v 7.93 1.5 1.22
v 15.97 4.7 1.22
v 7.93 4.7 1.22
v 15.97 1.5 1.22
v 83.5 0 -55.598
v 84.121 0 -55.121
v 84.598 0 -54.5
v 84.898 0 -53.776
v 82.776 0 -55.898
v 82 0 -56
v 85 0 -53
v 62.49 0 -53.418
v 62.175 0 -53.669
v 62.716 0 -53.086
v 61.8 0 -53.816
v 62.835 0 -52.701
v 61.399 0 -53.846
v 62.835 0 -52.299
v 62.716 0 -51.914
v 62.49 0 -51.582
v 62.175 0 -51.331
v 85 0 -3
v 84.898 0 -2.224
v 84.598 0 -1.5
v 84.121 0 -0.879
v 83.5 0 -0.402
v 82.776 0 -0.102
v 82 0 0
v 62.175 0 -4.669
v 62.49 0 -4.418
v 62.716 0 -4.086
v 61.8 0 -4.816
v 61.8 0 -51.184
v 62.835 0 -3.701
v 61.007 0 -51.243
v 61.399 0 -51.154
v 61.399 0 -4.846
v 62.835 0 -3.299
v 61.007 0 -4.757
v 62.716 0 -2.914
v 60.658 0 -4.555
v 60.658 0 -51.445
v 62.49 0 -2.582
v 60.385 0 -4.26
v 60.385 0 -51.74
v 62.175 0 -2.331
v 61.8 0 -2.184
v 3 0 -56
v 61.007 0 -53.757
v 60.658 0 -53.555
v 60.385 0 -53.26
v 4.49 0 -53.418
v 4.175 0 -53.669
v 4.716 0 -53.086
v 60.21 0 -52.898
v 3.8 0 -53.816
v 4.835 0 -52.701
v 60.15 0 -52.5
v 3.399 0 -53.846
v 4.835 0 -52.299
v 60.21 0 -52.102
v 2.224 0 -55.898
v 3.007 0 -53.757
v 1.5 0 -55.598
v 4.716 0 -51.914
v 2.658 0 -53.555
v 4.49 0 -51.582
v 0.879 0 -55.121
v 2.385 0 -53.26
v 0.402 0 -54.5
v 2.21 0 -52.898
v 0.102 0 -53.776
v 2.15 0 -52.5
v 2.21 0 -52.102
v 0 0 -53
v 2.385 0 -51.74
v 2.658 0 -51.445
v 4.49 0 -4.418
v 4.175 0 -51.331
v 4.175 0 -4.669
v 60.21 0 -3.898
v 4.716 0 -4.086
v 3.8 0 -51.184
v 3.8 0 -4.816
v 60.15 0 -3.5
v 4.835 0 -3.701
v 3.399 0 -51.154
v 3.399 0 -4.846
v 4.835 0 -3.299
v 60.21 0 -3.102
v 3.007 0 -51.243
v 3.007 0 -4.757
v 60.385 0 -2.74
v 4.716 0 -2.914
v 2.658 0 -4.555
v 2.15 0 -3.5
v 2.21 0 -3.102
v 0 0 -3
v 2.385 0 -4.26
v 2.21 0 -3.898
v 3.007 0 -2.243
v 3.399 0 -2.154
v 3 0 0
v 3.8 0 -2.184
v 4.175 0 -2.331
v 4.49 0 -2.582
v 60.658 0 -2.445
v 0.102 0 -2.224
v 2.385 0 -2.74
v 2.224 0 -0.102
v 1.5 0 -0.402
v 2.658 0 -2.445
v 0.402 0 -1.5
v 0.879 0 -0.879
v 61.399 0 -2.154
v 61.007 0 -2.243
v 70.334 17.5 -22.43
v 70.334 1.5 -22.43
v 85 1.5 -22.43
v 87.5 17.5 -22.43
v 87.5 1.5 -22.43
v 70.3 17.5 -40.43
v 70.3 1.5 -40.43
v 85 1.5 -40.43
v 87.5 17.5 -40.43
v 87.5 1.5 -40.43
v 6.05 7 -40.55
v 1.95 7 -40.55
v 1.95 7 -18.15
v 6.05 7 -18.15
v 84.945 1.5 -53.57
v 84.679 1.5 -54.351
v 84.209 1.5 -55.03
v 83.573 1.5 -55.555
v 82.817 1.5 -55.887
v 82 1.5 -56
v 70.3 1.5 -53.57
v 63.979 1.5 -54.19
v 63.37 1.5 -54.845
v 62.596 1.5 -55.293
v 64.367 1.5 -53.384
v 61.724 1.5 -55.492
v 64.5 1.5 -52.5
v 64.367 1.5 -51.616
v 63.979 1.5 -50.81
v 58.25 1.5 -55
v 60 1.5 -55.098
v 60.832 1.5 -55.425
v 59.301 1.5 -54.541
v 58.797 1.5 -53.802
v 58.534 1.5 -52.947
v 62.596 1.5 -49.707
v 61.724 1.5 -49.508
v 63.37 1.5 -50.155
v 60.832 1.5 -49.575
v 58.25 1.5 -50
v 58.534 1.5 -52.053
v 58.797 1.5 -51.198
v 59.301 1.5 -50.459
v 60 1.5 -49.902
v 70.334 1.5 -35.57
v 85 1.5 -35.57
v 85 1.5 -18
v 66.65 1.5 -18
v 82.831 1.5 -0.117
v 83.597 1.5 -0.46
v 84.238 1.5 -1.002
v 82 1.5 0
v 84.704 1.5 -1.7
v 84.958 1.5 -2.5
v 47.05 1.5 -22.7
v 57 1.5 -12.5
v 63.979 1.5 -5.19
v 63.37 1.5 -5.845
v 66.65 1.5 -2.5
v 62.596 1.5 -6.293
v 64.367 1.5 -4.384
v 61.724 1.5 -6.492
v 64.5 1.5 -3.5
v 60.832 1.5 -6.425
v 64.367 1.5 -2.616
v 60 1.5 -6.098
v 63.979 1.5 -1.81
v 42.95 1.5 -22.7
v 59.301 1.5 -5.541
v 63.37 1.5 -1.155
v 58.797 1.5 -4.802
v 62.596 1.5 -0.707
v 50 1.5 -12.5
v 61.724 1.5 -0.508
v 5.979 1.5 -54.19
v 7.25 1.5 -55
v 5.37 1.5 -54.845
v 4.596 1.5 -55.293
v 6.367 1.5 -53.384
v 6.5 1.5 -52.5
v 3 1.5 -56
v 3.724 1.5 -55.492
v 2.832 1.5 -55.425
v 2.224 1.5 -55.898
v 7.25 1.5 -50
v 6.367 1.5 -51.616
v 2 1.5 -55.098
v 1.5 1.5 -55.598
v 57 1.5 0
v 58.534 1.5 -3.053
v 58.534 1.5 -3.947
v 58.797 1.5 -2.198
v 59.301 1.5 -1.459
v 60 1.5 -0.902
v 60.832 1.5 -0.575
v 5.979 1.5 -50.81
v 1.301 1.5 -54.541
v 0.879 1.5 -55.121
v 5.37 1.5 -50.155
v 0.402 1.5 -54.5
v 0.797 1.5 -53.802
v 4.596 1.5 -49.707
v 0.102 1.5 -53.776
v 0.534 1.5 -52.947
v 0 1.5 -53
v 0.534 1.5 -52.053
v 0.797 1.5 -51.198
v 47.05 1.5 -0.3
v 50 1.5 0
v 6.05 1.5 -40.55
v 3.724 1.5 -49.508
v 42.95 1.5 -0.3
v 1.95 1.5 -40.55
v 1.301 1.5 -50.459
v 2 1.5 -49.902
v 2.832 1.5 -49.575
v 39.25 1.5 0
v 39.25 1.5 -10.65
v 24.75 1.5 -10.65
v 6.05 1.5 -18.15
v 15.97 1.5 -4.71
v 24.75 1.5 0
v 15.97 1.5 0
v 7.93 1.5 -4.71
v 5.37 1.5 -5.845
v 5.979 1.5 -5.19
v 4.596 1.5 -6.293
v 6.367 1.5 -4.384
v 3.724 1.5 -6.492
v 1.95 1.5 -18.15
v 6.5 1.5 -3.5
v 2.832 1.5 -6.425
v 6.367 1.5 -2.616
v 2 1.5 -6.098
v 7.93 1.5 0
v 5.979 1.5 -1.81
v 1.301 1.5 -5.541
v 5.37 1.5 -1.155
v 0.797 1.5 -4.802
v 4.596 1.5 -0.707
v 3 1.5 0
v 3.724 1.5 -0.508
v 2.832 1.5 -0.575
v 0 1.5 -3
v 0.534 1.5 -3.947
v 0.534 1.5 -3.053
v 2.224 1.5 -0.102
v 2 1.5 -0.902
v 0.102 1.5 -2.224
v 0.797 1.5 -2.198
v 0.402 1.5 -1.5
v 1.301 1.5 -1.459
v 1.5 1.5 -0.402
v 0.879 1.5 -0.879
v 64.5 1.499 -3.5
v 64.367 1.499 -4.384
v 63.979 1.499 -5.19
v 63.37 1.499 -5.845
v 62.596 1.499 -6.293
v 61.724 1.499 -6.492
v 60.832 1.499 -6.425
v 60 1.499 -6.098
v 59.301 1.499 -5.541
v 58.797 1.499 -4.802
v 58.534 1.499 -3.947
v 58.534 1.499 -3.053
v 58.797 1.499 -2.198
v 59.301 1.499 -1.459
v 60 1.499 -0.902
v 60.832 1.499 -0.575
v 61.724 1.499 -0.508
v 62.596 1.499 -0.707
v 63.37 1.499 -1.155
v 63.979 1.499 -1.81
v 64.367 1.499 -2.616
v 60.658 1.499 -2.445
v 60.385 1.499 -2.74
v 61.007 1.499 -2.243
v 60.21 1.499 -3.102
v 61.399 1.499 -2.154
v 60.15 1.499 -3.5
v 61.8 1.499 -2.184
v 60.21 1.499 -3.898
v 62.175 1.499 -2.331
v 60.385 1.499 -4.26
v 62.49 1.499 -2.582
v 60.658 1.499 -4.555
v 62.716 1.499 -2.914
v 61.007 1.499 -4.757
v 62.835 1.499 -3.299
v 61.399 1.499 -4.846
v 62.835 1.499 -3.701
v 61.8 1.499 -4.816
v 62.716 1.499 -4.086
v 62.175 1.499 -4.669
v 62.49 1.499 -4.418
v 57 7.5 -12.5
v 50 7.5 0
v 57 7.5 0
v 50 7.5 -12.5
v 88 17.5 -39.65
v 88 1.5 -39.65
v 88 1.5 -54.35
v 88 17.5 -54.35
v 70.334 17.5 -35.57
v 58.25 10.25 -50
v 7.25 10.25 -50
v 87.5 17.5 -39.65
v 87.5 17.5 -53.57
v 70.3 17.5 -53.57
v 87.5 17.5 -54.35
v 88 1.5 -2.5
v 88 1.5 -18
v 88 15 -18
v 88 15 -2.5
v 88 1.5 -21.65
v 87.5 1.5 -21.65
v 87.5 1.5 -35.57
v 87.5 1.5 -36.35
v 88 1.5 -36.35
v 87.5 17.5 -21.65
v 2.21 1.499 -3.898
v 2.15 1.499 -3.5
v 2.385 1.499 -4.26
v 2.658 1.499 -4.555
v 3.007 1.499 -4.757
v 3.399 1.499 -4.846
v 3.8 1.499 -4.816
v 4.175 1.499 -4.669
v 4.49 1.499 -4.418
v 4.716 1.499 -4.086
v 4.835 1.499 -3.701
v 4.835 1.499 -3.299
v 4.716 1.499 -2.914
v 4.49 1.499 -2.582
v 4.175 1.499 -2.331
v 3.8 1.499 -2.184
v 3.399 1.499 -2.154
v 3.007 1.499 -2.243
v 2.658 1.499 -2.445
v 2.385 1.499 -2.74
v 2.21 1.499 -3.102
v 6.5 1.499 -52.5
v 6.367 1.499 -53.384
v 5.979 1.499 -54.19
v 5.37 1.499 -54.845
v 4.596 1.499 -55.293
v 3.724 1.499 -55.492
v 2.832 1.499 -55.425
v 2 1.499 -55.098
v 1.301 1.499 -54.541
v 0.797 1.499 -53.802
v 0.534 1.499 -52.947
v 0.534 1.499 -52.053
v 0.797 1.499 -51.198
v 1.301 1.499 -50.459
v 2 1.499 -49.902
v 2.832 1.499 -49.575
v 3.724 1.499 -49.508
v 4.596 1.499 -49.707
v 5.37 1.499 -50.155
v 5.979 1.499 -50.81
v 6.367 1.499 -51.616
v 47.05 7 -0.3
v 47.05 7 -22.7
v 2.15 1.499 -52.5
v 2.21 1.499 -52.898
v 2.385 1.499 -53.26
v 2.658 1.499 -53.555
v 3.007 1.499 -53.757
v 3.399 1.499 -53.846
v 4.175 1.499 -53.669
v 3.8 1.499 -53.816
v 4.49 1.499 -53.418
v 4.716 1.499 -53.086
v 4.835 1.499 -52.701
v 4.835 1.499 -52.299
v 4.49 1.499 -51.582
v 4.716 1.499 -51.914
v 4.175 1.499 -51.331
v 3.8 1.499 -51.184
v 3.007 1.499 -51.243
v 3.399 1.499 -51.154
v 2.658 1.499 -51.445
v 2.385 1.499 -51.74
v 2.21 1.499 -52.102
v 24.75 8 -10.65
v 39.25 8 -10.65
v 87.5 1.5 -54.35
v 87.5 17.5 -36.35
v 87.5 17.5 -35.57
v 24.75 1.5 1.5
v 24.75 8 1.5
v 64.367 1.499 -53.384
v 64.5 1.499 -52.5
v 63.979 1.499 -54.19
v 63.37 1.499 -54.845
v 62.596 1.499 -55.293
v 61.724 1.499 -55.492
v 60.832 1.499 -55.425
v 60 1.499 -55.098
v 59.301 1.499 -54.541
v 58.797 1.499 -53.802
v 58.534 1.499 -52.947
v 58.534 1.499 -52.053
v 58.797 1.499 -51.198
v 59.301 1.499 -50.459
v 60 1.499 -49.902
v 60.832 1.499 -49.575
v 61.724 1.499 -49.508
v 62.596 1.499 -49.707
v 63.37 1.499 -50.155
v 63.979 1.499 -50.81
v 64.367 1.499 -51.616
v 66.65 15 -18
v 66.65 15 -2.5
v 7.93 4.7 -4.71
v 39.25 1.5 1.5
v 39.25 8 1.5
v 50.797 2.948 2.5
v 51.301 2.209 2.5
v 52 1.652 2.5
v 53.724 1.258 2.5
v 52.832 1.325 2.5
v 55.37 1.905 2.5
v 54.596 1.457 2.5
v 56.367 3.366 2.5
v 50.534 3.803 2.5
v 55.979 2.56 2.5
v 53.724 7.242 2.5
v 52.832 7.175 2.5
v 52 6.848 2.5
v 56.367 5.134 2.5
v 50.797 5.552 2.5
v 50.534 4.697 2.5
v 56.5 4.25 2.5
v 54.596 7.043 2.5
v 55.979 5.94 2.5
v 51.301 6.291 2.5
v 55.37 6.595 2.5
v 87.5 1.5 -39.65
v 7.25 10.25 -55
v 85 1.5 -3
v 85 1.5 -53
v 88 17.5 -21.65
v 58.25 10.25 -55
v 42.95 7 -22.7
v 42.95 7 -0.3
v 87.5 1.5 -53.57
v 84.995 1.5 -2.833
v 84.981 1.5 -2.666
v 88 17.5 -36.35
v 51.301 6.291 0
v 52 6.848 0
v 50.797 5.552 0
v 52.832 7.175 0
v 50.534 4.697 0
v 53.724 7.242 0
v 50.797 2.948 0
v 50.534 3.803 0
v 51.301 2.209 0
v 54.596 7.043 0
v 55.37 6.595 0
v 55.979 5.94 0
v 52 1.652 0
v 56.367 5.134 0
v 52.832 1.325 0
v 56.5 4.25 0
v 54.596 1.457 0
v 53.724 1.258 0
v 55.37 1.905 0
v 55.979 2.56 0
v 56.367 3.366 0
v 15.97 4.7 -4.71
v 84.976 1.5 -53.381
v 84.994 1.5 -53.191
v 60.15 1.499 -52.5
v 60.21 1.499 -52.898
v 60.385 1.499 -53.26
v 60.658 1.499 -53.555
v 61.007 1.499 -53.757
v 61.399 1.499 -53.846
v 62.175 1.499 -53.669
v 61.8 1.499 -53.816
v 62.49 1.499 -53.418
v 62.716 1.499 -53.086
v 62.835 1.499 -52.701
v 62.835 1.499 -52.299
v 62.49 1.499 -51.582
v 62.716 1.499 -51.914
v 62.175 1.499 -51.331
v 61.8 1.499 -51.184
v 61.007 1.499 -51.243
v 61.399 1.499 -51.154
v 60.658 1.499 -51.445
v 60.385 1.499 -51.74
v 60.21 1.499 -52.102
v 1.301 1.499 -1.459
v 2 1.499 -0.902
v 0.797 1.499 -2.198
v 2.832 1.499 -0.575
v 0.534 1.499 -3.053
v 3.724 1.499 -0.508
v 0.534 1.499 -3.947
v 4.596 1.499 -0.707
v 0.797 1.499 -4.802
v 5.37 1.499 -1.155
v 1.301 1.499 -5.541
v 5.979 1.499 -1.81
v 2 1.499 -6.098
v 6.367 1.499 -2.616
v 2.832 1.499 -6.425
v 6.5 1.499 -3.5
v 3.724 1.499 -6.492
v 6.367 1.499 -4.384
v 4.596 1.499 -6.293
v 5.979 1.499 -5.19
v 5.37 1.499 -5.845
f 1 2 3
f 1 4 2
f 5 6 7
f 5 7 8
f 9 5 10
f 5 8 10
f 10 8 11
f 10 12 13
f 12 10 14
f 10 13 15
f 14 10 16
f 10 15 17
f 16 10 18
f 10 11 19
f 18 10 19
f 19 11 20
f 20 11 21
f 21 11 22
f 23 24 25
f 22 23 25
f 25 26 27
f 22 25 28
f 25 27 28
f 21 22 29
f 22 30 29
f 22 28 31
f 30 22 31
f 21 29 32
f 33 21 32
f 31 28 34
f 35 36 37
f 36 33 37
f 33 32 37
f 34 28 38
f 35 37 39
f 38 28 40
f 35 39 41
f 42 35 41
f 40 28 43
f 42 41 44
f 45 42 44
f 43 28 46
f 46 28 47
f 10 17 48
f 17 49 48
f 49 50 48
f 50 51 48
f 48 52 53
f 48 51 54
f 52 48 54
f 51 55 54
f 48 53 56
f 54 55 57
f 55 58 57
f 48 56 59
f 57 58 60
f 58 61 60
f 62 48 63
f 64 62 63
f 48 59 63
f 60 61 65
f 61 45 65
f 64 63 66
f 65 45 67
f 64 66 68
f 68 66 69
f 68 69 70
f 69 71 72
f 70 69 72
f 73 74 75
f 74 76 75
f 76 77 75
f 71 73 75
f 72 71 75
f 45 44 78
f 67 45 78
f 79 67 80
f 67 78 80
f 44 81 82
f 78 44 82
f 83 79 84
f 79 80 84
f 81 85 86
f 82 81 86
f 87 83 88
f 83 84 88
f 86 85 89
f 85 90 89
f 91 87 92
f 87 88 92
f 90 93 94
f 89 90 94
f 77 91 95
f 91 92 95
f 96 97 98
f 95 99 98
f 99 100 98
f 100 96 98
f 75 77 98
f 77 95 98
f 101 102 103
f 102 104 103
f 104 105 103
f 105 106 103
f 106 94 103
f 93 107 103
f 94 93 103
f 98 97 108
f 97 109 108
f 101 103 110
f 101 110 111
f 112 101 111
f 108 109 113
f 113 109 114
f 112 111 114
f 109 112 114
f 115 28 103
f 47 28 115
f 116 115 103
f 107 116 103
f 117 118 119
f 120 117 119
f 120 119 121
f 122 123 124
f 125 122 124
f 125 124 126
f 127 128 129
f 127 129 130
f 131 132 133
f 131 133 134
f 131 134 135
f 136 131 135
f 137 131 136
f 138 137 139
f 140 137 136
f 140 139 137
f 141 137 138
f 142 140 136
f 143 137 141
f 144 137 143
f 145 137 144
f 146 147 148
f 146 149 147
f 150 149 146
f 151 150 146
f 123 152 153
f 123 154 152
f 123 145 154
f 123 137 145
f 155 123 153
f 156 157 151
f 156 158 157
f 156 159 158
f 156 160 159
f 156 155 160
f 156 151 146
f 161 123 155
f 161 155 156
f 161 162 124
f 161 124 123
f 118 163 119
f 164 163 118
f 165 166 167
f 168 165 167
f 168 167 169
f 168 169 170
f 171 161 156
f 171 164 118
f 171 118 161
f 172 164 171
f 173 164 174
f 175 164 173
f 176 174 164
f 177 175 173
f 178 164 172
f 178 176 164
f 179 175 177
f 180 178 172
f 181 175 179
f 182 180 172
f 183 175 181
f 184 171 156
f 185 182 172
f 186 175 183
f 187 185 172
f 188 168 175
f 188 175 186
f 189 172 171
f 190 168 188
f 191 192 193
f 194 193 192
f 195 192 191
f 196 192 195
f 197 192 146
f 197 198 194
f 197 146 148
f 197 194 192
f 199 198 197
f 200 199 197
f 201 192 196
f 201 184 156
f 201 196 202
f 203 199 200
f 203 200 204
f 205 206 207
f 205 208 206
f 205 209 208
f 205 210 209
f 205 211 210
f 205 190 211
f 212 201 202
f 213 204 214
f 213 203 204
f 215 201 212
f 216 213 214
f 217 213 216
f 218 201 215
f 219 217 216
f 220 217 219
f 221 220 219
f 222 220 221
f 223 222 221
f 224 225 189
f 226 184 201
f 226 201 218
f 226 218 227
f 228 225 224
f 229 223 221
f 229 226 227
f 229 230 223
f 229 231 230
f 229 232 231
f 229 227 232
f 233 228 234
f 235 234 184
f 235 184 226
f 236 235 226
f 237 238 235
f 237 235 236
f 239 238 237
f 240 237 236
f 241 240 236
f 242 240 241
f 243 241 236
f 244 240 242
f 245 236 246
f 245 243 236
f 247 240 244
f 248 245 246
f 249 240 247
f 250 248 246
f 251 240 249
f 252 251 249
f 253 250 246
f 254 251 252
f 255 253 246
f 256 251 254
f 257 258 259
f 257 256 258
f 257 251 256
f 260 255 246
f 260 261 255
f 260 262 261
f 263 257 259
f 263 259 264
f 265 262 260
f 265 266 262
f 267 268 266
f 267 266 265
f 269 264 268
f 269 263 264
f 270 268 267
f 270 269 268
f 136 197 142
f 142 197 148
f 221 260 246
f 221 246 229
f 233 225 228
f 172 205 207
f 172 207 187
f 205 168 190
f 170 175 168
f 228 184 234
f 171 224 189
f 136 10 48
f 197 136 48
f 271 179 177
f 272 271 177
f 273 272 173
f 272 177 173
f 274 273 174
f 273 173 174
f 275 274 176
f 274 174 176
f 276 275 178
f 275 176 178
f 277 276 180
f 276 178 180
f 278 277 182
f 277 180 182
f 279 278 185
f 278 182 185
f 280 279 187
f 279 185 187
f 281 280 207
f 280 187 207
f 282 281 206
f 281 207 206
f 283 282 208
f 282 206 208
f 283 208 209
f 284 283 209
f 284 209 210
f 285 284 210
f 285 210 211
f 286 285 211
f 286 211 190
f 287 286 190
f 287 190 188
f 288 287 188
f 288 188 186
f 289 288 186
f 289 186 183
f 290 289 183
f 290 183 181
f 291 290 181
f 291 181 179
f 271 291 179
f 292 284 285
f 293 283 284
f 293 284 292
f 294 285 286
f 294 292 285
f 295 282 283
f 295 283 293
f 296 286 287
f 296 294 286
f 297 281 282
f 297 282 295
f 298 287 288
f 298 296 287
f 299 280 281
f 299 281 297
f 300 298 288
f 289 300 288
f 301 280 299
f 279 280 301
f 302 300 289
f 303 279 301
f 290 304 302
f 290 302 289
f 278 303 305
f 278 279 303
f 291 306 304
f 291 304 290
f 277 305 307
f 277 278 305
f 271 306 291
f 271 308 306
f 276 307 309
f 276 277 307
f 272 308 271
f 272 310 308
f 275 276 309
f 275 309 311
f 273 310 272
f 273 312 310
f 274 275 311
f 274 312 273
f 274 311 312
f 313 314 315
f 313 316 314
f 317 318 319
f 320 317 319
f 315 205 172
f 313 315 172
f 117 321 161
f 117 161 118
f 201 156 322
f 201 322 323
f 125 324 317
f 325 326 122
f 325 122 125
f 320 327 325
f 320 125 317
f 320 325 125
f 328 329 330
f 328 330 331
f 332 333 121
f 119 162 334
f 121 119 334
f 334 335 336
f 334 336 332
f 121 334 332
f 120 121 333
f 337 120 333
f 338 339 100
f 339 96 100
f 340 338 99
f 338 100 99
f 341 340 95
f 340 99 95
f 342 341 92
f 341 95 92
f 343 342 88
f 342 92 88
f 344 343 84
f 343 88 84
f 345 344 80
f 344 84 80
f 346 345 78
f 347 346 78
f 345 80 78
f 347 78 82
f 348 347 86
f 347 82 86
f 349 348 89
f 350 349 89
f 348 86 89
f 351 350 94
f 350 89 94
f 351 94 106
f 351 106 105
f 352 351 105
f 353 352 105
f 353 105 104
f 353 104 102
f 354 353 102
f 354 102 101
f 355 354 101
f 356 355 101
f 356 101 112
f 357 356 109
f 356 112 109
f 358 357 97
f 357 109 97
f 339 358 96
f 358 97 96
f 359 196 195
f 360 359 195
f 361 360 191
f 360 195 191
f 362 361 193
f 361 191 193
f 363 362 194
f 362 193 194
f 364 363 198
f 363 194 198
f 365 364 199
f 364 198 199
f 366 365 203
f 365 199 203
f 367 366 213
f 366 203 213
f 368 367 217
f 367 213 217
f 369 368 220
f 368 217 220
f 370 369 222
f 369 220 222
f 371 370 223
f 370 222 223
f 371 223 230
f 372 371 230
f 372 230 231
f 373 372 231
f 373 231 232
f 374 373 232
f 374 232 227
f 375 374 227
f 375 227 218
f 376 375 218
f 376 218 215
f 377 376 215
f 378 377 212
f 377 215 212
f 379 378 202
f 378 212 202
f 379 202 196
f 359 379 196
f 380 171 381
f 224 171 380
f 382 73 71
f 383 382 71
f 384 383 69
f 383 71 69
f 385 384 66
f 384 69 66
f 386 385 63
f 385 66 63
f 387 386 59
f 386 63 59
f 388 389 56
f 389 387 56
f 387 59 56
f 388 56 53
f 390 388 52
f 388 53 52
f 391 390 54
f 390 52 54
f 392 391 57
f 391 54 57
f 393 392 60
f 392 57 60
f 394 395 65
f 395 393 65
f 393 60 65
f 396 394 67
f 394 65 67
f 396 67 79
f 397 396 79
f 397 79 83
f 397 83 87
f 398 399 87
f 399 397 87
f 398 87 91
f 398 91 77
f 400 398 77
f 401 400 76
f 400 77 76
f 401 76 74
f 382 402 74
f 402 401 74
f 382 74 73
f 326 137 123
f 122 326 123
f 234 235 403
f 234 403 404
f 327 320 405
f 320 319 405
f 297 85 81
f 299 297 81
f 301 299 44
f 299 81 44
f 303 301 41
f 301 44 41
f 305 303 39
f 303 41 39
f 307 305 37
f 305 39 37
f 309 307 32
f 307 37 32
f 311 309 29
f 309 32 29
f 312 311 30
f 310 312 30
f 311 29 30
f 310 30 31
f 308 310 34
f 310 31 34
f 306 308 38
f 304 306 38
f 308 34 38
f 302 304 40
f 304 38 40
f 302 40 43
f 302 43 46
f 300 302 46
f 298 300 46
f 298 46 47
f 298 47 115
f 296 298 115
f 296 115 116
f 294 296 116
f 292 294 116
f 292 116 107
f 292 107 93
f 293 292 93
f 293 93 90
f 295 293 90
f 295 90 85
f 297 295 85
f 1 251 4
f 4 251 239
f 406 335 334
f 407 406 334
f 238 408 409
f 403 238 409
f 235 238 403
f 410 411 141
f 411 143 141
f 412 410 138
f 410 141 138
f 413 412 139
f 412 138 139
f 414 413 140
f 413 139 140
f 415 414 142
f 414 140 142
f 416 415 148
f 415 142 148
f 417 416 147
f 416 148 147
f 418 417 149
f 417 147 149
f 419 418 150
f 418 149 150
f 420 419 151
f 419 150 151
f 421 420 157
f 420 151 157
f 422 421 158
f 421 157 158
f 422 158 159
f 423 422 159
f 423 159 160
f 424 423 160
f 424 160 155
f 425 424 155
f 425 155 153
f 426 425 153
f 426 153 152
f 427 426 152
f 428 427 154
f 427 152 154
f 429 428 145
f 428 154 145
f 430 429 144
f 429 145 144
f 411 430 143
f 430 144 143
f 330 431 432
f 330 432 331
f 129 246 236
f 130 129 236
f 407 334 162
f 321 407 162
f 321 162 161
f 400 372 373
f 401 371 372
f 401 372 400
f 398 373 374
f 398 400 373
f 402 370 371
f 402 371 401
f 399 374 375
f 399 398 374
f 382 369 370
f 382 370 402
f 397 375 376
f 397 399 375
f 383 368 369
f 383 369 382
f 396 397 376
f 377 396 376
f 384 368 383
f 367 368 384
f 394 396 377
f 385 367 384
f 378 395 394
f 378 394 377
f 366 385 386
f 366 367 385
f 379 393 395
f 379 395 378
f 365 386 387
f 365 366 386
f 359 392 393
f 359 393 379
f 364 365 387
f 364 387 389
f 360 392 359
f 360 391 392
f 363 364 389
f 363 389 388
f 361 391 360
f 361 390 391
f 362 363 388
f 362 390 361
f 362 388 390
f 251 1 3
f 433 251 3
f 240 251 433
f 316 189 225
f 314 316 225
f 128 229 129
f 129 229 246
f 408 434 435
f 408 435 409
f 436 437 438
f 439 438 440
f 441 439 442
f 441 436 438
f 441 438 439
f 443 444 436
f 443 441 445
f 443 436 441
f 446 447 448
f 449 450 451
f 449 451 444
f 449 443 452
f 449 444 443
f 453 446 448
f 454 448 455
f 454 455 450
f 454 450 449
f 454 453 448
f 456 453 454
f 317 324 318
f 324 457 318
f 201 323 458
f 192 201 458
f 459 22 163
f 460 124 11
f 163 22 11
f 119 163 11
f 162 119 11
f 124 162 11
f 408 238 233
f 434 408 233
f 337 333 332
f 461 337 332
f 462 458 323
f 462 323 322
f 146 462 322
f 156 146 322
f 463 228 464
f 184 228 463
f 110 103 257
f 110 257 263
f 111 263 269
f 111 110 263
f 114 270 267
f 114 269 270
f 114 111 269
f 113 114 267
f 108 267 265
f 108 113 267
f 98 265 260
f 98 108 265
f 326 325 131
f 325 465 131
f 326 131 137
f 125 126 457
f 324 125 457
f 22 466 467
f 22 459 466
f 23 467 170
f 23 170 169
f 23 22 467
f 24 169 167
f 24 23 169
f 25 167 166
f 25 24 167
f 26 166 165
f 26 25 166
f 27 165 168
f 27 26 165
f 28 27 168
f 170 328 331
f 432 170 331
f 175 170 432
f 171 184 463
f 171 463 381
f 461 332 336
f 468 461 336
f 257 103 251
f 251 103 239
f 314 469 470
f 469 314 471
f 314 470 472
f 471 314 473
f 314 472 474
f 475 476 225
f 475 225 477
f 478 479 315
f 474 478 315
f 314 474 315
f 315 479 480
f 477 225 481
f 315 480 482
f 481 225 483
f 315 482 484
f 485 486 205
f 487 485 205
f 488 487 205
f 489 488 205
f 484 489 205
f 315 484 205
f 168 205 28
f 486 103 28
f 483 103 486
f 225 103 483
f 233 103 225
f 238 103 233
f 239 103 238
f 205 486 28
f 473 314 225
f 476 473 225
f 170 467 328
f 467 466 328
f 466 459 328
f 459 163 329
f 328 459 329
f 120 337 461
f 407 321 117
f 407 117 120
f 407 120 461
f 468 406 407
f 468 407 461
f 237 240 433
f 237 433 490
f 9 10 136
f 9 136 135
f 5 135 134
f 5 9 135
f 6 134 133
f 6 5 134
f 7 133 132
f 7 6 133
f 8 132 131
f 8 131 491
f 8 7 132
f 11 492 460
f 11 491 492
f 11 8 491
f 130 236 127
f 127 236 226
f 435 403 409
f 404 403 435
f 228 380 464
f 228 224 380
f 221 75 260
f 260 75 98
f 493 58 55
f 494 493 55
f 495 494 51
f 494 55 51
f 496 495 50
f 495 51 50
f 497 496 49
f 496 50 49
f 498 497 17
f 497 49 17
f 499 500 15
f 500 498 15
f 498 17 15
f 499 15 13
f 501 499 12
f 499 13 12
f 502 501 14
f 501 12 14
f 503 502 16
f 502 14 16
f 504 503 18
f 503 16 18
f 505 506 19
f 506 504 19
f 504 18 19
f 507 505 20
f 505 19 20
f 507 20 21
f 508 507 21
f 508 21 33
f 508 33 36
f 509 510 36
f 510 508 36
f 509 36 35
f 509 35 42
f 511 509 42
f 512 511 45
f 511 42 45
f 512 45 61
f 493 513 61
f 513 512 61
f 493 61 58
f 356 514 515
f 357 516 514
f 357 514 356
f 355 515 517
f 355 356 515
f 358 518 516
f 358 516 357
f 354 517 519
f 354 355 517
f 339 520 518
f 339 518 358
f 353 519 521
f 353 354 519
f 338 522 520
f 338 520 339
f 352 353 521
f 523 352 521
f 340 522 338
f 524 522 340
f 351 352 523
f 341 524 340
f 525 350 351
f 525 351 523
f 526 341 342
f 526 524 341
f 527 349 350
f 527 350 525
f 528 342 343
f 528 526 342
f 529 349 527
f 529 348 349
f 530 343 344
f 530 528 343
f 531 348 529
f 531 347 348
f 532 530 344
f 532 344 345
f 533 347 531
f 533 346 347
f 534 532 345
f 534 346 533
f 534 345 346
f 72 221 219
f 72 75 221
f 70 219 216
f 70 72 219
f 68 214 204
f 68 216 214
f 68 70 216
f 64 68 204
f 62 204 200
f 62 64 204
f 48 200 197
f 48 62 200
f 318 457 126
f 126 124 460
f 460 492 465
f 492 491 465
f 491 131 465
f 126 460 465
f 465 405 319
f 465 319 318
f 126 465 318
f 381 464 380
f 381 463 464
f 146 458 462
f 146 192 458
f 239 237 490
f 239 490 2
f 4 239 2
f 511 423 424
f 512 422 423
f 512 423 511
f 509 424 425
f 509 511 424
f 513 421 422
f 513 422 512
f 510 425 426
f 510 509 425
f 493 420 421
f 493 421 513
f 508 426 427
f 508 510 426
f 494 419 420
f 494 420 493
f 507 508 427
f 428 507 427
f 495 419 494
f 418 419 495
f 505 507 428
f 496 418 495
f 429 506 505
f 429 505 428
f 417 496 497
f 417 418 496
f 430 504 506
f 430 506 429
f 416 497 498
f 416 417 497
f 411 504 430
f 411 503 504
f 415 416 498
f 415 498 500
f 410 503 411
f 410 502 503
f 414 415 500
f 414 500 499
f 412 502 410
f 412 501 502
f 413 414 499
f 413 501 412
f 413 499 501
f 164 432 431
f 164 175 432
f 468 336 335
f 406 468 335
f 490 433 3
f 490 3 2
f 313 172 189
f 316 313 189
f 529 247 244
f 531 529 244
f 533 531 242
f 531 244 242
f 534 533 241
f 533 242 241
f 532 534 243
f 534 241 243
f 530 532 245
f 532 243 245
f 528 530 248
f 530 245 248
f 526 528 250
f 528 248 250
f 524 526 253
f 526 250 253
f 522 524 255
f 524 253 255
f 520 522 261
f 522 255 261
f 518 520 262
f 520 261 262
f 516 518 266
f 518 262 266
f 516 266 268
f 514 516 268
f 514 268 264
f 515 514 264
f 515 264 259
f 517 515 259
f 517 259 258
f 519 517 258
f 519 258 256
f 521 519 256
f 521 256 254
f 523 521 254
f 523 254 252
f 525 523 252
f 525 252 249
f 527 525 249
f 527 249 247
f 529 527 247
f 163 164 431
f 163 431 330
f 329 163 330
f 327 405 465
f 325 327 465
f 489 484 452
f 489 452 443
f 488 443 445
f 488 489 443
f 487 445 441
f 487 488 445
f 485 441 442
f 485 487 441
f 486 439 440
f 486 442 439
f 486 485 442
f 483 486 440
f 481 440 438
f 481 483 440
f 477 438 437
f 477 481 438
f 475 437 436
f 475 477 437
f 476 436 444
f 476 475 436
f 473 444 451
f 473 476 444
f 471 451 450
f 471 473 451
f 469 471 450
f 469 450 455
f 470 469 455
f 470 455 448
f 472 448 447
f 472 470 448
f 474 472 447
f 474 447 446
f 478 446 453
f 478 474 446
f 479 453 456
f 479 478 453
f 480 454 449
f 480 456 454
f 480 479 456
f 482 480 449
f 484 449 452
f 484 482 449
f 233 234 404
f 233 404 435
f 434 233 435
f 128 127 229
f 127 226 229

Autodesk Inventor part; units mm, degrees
ref_plane "YZ Plane" through (0, 0, 0) normal (1, 0, 0) x (0, 1, 0)
ref_plane "XZ Plane" through (0, 0, 0) normal (0, 1, 0) x (-1, 0, 0)
ref_plane "XY Plane" through (0, 0, 0) normal (0, 0, 1) x (1, 0, 0)
sketch "Sketch1" plane through (0, 0, 0) normal (0, 1, 0) x (-1, 0, 0)
  line L0 (-3, 0) -> (-82, 0)
  line L1 (-85, -3) -> (-85, -53)
  line L2 (-82, -56) -> (-3, -56)
  line L3 (0, -53) -> (0, -3)
  arc A0 (-3, -56) -> (0, -53) centre (-3, -53) ccw
  arc A1 (0, -3) -> (-3, 0) centre (-3, -3) ccw
  arc A2 (-82, 0) -> (-85, -3) centre (-82, -3) ccw
  arc A3 (-85, -53) -> (-82, -56) centre (-82, -53) ccw
  circle A4 centre (-3.5, -52.5) radius 1.35
  circle A5 centre (-3.5, -3.5) radius 1.35
  circle A6 centre (-61.5, -52.5) radius 1.35
  circle A7 centre (-61.5, -3.5) radius 1.35
  point P0 (0, 0)
  point P1 (-85, -56)
  point P2 (-85, 0)
  point P3 (0, -56)
  dimension "d0" = 85
  dimension "d1" = 56
  dimension "d2" = 3
  dimension "d9" = 2.7
  dimension "d10" = 2.7
  dimension "d15" = 2.7
  dimension "d16" = 2.7
  dimension "d140" = 58
  dimension "d141" = 58
  dimension "d142" = 49
  dimension "d143" = 3.5
extrude "Extrusion1" add sketch "Sketch1" along normal blind 1.5
sketch "Sketch2" plane through (0, 1.5, 0) normal (0, 1, 0) x (1, 0, 0)
  circle A0 centre (3.5, 3.5) radius 1.35 projected
  circle A1 centre (3.5, 3.5) radius 3
  circle A2 centre (3.5, 52.5) radius 1.35 projected
  circle A3 centre (3.5, 52.5) radius 3
  circle A4 centre (61.5, 52.5) radius 1.35 projected
  circle A5 centre (61.5, 52.5) radius 3
  circle A6 centre (61.5, 3.5) radius 1.35 projected
  circle A7 centre (61.5, 3.5) radius 3
  point P0 (0, 0)
  dimension "d19" = 6
  dimension "d20" = 6
  dimension "d21" = 6
  dimension "d22" = 6
extrude "Extrusion2" cut sketch "Sketch2" against normal blind 0.001 contours A0 | A1 | A3 | A5 | A6 | A7
sketch "Sketch3" plane through (0, 1.5, 0) normal (0, 1, 0) x (1, 0, 0)
  line L0 (7.25, 55) -> (58.25, 55)
  line L1 (58.25, 55) -> (58.25, 50)
  line L2 (58.25, 50) -> (7.25, 50)
  line L3 (7.25, 50) -> (7.25, 55)
  line L4 (32.75, 55) -> (32.75, 50)
  line L5 (32.75, 52.5) -> (7.25, 52.5)
  line L6 (0, 53) -> (0, 3) projected
  line L7 (82, 56) -> (3, 56) projected
  circle A0 centre (3.5, 52.5) radius 1.35 projected
  point P0 (0, 0)
  dimension "d25" = 51
  dimension "d26" = 5
  dimension "d28" = 25.5
  dimension "d29" = 2.5
  dimension "d30" = 3.5
  dimension "d152" = 7.25
extrude "Extrusion3" add sketch "Sketch3" along normal blind 8.75 contours L0 L4 L5 L3 | L0 L1 L2 L4 | L5 L4 L2 L3
sketch "Sketch4" plane through (0, 1.5, 0) normal (0, 1, 0) x (1, 0, 0)
  line L0 (1.95, 18.15) -> (6.05, 18.15)
  line L1 (6.05, 18.15) -> (6.05, 40.55)
  line L2 (6.05, 40.55) -> (1.95, 40.55)
  line L3 (1.95, 40.55) -> (1.95, 18.15)
  line L4 (4, 40.55) -> (4, 18.15)
  line L5 (1.95, 29.35) -> (6.05, 29.35)
  line L6 (0, 53) -> (0, 3) projected
  circle A0 centre (3.5, 3.5) radius 1.35 projected
  point P0 (0, 0)
  dimension "d34" = 4.1
  dimension "d35" = 22.4
  dimension "d36" = 4
  dimension "d37" = 24.5
extrude "Extrusion4" add sketch "Sketch4" along normal blind 5.5 contours L3 L5 L4 L0 | L4 L5 L1 L0 | L3 L2 L4 L5 | L4 L2 L1 L5
sketch "Sketch5" plane through (0, 1.5, 0) normal (0, 1, 0) x (1, 0, 0)
  line L0 (7.93, 4.71) -> (15.97, 4.71)
  line L1 (15.97, 4.71) -> (15.97, -1.22)
  line L2 (15.97, -1.22) -> (7.93, -1.22)
  line L3 (7.93, -1.22) -> (7.93, 4.71)
  line L4 (3, 0) -> (82, 0) projected
  line L5 (11.95, -1.22) -> (11.95, 4.71)
  circle A0 centre (3.5, 3.5) radius 1.35 projected
  point P0 (0, 0)
  dimension "d44" = 1.22
  dimension "d45" = 5.93
  dimension "d46" = 8.04
  dimension "d74" = 7.1
extrude "Extrusion5" add sketch "Sketch5" along normal blind 3.2 contours L0 L5 L4 L3 | L0 L1 L4 L5 | L4 L5 L2 L3 | L4 L1 L2 L5
sketch "Sketch6" plane through (0, 1.5, 0) normal (0, 1, 0) x (1, 0, 0)
  line L0 (7.93, -1.22) -> (15.97, -1.22) projected
  line L1 (11.95, -1.22) -> (11.95, 4.71)
  line L2 (7.93, 4.71) -> (15.97, 4.71) projected
  line L3 (24.75, 10.65) -> (39.25, 10.65)
  line L4 (39.25, 10.65) -> (39.25, -1.5)
  line L5 (39.25, -1.5) -> (24.75, -1.5)
  line L6 (24.75, -1.5) -> (24.75, 10.65)
  line L7 (15.97, 0) -> (82, 0) projected
  circle A0 centre (3.5, 3.5) radius 1.35 projected
  line L8 (0, 53) -> (0, 3) projected
  point P0 (0, 0)
  dimension "d144" = 14.5
  dimension "d145" = 12.15
  dimension "d146" = 1.5
  dimension "d153" = 24.75
extrude "Extrusion6" add sketch "Sketch6" along normal blind 6.5 contours L3 L4 L7 L6 | L7 L4 L5 L6
sketch "Sketch7" plane through (0, 1.5, 0) normal (0, 1, 0) x (1, 0, 0)
  line L0 (1.95, 40.55) -> (1.95, 18.15) projected
  line L1 (6.05, 18.15) -> (6.05, 40.55) projected
  line L2 (42.95, 22.7) -> (47.05, 22.7)
  line L3 (47.05, 22.7) -> (47.05, 0.3)
  line L4 (47.05, 0.3) -> (42.95, 0.3)
  line L5 (42.95, 0.3) -> (42.95, 22.7)
  line L6 (45, 0.3) -> (45, 22.7)
  line L7 (42.95, 11.5) -> (47.05, 11.5)
  line L8 (0, 53) -> (0, 3) projected
  point P0 (0, 0)
  dimension "d78" = 4.1
  dimension "d80" = 22.4
  dimension "d150" = 45
extrude "Extrusion7" add sketch "Sketch7" along normal blind 5.5
sketch "Sketch8" plane through (0, 1.5, 0) normal (0, 1, 0) x (1, 0, 0)
  line L0 (50, 0) -> (57, 0)
  line L1 (57, 0) -> (57, 12.5)
  line L2 (57, 12.5) -> (50, 12.5)
  line L3 (50, 12.5) -> (50, 0)
  line L4 (50, 6.25) -> (57, 6.25)
  line L5 (53.5, 0) -> (53.5, 12.5)
  line L6 (3, 0) -> (82, 0) projected
  line L7 (47.05, 0.3) -> (42.95, 0.3) projected
  line L8 (45, 0.3) -> (45, 22.7)
  line L9 (42.95, 22.7) -> (47.05, 22.7) projected
  circle A0 centre (3.5, 3.5) radius 1.35 projected
  line L10 (0, 53) -> (0, 3) projected
  point P0 (0, 0)
  point P1 (43.35, 0)
  dimension "d85" = 7
  dimension "d86" = 12.5
  dimension "d89" = 0
  dimension "d149" = 53.5
extrude "Extrusion8" add sketch "Sketch8" along normal blind 6 contours L3 L4 L5 L0 | L5 L4 L1 L0 | L3 L2 L5 L4 | L5 L2 L1 L4
sketch "Sketch9" plane through (3, 0, 0) normal (0, 0, 1) x (1, 0, 0)
  line L0 (54, 7.5) -> (47, 7.5) projected
  line L1 (54, 1.5) -> (54, 7.5) projected
  circle A0 centre (50.5, 4.25) radius 3
  point P0 (-3, 0)
  dimension "d96" = 3.5
  dimension "d97" = 3.25
  dimension "d98" = 6
extrude "Extrusion9" add sketch "Sketch9" along normal blind 2.5
sketch "Sketch10" plane through (0, 1.5, 0) normal (0, 1, 0) x (1, 0, 0)
  line L0 (66.65, 18) -> (88, 18)
  line L1 (88, 18) -> (88, 2.5)
  line L2 (88, 2.5) -> (66.65, 2.5)
  line L3 (66.65, 2.5) -> (66.65, 18)
  line L4 (85, 3) -> (85, 53) projected
  line L5 (88, 10.25) -> (66.65, 10.25)
  line L6 (57, 0) -> (82, 0) projected
  point P0 (0, 0)
  dimension "d101" = 21.35
  dimension "d102" = 15.5
  dimension "d103" = 3
  dimension "d104" = 10.25
extrude "Extrusion10" add sketch "Sketch10" along normal blind 13.5
sketch "Sketch11" plane through (0, 1.5, 0) normal (0, 1, 0) x (1, 0, 0)
  line L0 (70.3341, 22.43) -> (87.5, 22.43)
  line L1 (88, 2.4833) -> (88, 15.6315)
  line L2 (87.5, 35.57) -> (70.3341, 35.57)
  line L3 (70.3341, 35.57) -> (70.3341, 22.43)
  line L4 (85, 3) -> (85, 53) projected
  line L5 (88, 36.35) -> (87.5, 36.35)
  line L6 (87.5, 21.65) -> (88, 21.65)
  line L7 (88, 21.65) -> (88, 36.35)
  line L8 (87.5, 36.35) -> (87.5, 35.57)
  line L9 (87.5, 22.43) -> (87.5, 21.65)
  line L10 (88, 29) -> (70.3341, 29)
  line L11 (70.3, 40.43) -> (87.5, 40.43)
  line L12 (88, 22.6143) -> (88, 34.7304)
  line L13 (87.5, 53.57) -> (70.3, 53.57)
  line L14 (70.3, 53.57) -> (70.3, 40.43)
  line L15 (88, 54.35) -> (87.5, 54.35)
  line L16 (87.5, 39.65) -> (88, 39.65)
  line L17 (88, 39.65) -> (88, 54.35)
  line L18 (87.5, 54.35) -> (87.5, 53.57)
  line L19 (87.5, 40.43) -> (87.5, 39.65)
  line L20 (88, 47) -> (70.3, 47)
  line L21 (66.65, 2.5) -> (66.65, 18) projected
  line L22 (66.65, 10.25) -> (88, 10.25)
  line L23 (57, 0) -> (82, 0) projected
  point P0 (0, 0)
  point P1 (85, 38)
  point P2 (88, 34.35)
  dimension "d107" = 3
  dimension "d109" = 13.14
  dimension "d113" = 14.7
  dimension "d115" = 13.14
  dimension "d119" = 14.7
  dimension "d123" = 29
  dimension "d125" = 14.7
  dimension "d126" = 3
  dimension "d127" = 3
  dimension "d129" = 2.5
  dimension "d130" = 2.5
  dimension "d131" = 2.5
  dimension "d132" = 14.6659
  dimension "d133" = 3
  dimension "d134" = 34.7304
  dimension "d135" = 22.6143
  dimension "d136" = 15.6315
  dimension "d137" = 2.4833
  dimension "d151" = 47
extrude "Extrusion11" add sketch "Sketch11" along normal blind 16
properties part number "RaspberryPi3B_Mockup"
